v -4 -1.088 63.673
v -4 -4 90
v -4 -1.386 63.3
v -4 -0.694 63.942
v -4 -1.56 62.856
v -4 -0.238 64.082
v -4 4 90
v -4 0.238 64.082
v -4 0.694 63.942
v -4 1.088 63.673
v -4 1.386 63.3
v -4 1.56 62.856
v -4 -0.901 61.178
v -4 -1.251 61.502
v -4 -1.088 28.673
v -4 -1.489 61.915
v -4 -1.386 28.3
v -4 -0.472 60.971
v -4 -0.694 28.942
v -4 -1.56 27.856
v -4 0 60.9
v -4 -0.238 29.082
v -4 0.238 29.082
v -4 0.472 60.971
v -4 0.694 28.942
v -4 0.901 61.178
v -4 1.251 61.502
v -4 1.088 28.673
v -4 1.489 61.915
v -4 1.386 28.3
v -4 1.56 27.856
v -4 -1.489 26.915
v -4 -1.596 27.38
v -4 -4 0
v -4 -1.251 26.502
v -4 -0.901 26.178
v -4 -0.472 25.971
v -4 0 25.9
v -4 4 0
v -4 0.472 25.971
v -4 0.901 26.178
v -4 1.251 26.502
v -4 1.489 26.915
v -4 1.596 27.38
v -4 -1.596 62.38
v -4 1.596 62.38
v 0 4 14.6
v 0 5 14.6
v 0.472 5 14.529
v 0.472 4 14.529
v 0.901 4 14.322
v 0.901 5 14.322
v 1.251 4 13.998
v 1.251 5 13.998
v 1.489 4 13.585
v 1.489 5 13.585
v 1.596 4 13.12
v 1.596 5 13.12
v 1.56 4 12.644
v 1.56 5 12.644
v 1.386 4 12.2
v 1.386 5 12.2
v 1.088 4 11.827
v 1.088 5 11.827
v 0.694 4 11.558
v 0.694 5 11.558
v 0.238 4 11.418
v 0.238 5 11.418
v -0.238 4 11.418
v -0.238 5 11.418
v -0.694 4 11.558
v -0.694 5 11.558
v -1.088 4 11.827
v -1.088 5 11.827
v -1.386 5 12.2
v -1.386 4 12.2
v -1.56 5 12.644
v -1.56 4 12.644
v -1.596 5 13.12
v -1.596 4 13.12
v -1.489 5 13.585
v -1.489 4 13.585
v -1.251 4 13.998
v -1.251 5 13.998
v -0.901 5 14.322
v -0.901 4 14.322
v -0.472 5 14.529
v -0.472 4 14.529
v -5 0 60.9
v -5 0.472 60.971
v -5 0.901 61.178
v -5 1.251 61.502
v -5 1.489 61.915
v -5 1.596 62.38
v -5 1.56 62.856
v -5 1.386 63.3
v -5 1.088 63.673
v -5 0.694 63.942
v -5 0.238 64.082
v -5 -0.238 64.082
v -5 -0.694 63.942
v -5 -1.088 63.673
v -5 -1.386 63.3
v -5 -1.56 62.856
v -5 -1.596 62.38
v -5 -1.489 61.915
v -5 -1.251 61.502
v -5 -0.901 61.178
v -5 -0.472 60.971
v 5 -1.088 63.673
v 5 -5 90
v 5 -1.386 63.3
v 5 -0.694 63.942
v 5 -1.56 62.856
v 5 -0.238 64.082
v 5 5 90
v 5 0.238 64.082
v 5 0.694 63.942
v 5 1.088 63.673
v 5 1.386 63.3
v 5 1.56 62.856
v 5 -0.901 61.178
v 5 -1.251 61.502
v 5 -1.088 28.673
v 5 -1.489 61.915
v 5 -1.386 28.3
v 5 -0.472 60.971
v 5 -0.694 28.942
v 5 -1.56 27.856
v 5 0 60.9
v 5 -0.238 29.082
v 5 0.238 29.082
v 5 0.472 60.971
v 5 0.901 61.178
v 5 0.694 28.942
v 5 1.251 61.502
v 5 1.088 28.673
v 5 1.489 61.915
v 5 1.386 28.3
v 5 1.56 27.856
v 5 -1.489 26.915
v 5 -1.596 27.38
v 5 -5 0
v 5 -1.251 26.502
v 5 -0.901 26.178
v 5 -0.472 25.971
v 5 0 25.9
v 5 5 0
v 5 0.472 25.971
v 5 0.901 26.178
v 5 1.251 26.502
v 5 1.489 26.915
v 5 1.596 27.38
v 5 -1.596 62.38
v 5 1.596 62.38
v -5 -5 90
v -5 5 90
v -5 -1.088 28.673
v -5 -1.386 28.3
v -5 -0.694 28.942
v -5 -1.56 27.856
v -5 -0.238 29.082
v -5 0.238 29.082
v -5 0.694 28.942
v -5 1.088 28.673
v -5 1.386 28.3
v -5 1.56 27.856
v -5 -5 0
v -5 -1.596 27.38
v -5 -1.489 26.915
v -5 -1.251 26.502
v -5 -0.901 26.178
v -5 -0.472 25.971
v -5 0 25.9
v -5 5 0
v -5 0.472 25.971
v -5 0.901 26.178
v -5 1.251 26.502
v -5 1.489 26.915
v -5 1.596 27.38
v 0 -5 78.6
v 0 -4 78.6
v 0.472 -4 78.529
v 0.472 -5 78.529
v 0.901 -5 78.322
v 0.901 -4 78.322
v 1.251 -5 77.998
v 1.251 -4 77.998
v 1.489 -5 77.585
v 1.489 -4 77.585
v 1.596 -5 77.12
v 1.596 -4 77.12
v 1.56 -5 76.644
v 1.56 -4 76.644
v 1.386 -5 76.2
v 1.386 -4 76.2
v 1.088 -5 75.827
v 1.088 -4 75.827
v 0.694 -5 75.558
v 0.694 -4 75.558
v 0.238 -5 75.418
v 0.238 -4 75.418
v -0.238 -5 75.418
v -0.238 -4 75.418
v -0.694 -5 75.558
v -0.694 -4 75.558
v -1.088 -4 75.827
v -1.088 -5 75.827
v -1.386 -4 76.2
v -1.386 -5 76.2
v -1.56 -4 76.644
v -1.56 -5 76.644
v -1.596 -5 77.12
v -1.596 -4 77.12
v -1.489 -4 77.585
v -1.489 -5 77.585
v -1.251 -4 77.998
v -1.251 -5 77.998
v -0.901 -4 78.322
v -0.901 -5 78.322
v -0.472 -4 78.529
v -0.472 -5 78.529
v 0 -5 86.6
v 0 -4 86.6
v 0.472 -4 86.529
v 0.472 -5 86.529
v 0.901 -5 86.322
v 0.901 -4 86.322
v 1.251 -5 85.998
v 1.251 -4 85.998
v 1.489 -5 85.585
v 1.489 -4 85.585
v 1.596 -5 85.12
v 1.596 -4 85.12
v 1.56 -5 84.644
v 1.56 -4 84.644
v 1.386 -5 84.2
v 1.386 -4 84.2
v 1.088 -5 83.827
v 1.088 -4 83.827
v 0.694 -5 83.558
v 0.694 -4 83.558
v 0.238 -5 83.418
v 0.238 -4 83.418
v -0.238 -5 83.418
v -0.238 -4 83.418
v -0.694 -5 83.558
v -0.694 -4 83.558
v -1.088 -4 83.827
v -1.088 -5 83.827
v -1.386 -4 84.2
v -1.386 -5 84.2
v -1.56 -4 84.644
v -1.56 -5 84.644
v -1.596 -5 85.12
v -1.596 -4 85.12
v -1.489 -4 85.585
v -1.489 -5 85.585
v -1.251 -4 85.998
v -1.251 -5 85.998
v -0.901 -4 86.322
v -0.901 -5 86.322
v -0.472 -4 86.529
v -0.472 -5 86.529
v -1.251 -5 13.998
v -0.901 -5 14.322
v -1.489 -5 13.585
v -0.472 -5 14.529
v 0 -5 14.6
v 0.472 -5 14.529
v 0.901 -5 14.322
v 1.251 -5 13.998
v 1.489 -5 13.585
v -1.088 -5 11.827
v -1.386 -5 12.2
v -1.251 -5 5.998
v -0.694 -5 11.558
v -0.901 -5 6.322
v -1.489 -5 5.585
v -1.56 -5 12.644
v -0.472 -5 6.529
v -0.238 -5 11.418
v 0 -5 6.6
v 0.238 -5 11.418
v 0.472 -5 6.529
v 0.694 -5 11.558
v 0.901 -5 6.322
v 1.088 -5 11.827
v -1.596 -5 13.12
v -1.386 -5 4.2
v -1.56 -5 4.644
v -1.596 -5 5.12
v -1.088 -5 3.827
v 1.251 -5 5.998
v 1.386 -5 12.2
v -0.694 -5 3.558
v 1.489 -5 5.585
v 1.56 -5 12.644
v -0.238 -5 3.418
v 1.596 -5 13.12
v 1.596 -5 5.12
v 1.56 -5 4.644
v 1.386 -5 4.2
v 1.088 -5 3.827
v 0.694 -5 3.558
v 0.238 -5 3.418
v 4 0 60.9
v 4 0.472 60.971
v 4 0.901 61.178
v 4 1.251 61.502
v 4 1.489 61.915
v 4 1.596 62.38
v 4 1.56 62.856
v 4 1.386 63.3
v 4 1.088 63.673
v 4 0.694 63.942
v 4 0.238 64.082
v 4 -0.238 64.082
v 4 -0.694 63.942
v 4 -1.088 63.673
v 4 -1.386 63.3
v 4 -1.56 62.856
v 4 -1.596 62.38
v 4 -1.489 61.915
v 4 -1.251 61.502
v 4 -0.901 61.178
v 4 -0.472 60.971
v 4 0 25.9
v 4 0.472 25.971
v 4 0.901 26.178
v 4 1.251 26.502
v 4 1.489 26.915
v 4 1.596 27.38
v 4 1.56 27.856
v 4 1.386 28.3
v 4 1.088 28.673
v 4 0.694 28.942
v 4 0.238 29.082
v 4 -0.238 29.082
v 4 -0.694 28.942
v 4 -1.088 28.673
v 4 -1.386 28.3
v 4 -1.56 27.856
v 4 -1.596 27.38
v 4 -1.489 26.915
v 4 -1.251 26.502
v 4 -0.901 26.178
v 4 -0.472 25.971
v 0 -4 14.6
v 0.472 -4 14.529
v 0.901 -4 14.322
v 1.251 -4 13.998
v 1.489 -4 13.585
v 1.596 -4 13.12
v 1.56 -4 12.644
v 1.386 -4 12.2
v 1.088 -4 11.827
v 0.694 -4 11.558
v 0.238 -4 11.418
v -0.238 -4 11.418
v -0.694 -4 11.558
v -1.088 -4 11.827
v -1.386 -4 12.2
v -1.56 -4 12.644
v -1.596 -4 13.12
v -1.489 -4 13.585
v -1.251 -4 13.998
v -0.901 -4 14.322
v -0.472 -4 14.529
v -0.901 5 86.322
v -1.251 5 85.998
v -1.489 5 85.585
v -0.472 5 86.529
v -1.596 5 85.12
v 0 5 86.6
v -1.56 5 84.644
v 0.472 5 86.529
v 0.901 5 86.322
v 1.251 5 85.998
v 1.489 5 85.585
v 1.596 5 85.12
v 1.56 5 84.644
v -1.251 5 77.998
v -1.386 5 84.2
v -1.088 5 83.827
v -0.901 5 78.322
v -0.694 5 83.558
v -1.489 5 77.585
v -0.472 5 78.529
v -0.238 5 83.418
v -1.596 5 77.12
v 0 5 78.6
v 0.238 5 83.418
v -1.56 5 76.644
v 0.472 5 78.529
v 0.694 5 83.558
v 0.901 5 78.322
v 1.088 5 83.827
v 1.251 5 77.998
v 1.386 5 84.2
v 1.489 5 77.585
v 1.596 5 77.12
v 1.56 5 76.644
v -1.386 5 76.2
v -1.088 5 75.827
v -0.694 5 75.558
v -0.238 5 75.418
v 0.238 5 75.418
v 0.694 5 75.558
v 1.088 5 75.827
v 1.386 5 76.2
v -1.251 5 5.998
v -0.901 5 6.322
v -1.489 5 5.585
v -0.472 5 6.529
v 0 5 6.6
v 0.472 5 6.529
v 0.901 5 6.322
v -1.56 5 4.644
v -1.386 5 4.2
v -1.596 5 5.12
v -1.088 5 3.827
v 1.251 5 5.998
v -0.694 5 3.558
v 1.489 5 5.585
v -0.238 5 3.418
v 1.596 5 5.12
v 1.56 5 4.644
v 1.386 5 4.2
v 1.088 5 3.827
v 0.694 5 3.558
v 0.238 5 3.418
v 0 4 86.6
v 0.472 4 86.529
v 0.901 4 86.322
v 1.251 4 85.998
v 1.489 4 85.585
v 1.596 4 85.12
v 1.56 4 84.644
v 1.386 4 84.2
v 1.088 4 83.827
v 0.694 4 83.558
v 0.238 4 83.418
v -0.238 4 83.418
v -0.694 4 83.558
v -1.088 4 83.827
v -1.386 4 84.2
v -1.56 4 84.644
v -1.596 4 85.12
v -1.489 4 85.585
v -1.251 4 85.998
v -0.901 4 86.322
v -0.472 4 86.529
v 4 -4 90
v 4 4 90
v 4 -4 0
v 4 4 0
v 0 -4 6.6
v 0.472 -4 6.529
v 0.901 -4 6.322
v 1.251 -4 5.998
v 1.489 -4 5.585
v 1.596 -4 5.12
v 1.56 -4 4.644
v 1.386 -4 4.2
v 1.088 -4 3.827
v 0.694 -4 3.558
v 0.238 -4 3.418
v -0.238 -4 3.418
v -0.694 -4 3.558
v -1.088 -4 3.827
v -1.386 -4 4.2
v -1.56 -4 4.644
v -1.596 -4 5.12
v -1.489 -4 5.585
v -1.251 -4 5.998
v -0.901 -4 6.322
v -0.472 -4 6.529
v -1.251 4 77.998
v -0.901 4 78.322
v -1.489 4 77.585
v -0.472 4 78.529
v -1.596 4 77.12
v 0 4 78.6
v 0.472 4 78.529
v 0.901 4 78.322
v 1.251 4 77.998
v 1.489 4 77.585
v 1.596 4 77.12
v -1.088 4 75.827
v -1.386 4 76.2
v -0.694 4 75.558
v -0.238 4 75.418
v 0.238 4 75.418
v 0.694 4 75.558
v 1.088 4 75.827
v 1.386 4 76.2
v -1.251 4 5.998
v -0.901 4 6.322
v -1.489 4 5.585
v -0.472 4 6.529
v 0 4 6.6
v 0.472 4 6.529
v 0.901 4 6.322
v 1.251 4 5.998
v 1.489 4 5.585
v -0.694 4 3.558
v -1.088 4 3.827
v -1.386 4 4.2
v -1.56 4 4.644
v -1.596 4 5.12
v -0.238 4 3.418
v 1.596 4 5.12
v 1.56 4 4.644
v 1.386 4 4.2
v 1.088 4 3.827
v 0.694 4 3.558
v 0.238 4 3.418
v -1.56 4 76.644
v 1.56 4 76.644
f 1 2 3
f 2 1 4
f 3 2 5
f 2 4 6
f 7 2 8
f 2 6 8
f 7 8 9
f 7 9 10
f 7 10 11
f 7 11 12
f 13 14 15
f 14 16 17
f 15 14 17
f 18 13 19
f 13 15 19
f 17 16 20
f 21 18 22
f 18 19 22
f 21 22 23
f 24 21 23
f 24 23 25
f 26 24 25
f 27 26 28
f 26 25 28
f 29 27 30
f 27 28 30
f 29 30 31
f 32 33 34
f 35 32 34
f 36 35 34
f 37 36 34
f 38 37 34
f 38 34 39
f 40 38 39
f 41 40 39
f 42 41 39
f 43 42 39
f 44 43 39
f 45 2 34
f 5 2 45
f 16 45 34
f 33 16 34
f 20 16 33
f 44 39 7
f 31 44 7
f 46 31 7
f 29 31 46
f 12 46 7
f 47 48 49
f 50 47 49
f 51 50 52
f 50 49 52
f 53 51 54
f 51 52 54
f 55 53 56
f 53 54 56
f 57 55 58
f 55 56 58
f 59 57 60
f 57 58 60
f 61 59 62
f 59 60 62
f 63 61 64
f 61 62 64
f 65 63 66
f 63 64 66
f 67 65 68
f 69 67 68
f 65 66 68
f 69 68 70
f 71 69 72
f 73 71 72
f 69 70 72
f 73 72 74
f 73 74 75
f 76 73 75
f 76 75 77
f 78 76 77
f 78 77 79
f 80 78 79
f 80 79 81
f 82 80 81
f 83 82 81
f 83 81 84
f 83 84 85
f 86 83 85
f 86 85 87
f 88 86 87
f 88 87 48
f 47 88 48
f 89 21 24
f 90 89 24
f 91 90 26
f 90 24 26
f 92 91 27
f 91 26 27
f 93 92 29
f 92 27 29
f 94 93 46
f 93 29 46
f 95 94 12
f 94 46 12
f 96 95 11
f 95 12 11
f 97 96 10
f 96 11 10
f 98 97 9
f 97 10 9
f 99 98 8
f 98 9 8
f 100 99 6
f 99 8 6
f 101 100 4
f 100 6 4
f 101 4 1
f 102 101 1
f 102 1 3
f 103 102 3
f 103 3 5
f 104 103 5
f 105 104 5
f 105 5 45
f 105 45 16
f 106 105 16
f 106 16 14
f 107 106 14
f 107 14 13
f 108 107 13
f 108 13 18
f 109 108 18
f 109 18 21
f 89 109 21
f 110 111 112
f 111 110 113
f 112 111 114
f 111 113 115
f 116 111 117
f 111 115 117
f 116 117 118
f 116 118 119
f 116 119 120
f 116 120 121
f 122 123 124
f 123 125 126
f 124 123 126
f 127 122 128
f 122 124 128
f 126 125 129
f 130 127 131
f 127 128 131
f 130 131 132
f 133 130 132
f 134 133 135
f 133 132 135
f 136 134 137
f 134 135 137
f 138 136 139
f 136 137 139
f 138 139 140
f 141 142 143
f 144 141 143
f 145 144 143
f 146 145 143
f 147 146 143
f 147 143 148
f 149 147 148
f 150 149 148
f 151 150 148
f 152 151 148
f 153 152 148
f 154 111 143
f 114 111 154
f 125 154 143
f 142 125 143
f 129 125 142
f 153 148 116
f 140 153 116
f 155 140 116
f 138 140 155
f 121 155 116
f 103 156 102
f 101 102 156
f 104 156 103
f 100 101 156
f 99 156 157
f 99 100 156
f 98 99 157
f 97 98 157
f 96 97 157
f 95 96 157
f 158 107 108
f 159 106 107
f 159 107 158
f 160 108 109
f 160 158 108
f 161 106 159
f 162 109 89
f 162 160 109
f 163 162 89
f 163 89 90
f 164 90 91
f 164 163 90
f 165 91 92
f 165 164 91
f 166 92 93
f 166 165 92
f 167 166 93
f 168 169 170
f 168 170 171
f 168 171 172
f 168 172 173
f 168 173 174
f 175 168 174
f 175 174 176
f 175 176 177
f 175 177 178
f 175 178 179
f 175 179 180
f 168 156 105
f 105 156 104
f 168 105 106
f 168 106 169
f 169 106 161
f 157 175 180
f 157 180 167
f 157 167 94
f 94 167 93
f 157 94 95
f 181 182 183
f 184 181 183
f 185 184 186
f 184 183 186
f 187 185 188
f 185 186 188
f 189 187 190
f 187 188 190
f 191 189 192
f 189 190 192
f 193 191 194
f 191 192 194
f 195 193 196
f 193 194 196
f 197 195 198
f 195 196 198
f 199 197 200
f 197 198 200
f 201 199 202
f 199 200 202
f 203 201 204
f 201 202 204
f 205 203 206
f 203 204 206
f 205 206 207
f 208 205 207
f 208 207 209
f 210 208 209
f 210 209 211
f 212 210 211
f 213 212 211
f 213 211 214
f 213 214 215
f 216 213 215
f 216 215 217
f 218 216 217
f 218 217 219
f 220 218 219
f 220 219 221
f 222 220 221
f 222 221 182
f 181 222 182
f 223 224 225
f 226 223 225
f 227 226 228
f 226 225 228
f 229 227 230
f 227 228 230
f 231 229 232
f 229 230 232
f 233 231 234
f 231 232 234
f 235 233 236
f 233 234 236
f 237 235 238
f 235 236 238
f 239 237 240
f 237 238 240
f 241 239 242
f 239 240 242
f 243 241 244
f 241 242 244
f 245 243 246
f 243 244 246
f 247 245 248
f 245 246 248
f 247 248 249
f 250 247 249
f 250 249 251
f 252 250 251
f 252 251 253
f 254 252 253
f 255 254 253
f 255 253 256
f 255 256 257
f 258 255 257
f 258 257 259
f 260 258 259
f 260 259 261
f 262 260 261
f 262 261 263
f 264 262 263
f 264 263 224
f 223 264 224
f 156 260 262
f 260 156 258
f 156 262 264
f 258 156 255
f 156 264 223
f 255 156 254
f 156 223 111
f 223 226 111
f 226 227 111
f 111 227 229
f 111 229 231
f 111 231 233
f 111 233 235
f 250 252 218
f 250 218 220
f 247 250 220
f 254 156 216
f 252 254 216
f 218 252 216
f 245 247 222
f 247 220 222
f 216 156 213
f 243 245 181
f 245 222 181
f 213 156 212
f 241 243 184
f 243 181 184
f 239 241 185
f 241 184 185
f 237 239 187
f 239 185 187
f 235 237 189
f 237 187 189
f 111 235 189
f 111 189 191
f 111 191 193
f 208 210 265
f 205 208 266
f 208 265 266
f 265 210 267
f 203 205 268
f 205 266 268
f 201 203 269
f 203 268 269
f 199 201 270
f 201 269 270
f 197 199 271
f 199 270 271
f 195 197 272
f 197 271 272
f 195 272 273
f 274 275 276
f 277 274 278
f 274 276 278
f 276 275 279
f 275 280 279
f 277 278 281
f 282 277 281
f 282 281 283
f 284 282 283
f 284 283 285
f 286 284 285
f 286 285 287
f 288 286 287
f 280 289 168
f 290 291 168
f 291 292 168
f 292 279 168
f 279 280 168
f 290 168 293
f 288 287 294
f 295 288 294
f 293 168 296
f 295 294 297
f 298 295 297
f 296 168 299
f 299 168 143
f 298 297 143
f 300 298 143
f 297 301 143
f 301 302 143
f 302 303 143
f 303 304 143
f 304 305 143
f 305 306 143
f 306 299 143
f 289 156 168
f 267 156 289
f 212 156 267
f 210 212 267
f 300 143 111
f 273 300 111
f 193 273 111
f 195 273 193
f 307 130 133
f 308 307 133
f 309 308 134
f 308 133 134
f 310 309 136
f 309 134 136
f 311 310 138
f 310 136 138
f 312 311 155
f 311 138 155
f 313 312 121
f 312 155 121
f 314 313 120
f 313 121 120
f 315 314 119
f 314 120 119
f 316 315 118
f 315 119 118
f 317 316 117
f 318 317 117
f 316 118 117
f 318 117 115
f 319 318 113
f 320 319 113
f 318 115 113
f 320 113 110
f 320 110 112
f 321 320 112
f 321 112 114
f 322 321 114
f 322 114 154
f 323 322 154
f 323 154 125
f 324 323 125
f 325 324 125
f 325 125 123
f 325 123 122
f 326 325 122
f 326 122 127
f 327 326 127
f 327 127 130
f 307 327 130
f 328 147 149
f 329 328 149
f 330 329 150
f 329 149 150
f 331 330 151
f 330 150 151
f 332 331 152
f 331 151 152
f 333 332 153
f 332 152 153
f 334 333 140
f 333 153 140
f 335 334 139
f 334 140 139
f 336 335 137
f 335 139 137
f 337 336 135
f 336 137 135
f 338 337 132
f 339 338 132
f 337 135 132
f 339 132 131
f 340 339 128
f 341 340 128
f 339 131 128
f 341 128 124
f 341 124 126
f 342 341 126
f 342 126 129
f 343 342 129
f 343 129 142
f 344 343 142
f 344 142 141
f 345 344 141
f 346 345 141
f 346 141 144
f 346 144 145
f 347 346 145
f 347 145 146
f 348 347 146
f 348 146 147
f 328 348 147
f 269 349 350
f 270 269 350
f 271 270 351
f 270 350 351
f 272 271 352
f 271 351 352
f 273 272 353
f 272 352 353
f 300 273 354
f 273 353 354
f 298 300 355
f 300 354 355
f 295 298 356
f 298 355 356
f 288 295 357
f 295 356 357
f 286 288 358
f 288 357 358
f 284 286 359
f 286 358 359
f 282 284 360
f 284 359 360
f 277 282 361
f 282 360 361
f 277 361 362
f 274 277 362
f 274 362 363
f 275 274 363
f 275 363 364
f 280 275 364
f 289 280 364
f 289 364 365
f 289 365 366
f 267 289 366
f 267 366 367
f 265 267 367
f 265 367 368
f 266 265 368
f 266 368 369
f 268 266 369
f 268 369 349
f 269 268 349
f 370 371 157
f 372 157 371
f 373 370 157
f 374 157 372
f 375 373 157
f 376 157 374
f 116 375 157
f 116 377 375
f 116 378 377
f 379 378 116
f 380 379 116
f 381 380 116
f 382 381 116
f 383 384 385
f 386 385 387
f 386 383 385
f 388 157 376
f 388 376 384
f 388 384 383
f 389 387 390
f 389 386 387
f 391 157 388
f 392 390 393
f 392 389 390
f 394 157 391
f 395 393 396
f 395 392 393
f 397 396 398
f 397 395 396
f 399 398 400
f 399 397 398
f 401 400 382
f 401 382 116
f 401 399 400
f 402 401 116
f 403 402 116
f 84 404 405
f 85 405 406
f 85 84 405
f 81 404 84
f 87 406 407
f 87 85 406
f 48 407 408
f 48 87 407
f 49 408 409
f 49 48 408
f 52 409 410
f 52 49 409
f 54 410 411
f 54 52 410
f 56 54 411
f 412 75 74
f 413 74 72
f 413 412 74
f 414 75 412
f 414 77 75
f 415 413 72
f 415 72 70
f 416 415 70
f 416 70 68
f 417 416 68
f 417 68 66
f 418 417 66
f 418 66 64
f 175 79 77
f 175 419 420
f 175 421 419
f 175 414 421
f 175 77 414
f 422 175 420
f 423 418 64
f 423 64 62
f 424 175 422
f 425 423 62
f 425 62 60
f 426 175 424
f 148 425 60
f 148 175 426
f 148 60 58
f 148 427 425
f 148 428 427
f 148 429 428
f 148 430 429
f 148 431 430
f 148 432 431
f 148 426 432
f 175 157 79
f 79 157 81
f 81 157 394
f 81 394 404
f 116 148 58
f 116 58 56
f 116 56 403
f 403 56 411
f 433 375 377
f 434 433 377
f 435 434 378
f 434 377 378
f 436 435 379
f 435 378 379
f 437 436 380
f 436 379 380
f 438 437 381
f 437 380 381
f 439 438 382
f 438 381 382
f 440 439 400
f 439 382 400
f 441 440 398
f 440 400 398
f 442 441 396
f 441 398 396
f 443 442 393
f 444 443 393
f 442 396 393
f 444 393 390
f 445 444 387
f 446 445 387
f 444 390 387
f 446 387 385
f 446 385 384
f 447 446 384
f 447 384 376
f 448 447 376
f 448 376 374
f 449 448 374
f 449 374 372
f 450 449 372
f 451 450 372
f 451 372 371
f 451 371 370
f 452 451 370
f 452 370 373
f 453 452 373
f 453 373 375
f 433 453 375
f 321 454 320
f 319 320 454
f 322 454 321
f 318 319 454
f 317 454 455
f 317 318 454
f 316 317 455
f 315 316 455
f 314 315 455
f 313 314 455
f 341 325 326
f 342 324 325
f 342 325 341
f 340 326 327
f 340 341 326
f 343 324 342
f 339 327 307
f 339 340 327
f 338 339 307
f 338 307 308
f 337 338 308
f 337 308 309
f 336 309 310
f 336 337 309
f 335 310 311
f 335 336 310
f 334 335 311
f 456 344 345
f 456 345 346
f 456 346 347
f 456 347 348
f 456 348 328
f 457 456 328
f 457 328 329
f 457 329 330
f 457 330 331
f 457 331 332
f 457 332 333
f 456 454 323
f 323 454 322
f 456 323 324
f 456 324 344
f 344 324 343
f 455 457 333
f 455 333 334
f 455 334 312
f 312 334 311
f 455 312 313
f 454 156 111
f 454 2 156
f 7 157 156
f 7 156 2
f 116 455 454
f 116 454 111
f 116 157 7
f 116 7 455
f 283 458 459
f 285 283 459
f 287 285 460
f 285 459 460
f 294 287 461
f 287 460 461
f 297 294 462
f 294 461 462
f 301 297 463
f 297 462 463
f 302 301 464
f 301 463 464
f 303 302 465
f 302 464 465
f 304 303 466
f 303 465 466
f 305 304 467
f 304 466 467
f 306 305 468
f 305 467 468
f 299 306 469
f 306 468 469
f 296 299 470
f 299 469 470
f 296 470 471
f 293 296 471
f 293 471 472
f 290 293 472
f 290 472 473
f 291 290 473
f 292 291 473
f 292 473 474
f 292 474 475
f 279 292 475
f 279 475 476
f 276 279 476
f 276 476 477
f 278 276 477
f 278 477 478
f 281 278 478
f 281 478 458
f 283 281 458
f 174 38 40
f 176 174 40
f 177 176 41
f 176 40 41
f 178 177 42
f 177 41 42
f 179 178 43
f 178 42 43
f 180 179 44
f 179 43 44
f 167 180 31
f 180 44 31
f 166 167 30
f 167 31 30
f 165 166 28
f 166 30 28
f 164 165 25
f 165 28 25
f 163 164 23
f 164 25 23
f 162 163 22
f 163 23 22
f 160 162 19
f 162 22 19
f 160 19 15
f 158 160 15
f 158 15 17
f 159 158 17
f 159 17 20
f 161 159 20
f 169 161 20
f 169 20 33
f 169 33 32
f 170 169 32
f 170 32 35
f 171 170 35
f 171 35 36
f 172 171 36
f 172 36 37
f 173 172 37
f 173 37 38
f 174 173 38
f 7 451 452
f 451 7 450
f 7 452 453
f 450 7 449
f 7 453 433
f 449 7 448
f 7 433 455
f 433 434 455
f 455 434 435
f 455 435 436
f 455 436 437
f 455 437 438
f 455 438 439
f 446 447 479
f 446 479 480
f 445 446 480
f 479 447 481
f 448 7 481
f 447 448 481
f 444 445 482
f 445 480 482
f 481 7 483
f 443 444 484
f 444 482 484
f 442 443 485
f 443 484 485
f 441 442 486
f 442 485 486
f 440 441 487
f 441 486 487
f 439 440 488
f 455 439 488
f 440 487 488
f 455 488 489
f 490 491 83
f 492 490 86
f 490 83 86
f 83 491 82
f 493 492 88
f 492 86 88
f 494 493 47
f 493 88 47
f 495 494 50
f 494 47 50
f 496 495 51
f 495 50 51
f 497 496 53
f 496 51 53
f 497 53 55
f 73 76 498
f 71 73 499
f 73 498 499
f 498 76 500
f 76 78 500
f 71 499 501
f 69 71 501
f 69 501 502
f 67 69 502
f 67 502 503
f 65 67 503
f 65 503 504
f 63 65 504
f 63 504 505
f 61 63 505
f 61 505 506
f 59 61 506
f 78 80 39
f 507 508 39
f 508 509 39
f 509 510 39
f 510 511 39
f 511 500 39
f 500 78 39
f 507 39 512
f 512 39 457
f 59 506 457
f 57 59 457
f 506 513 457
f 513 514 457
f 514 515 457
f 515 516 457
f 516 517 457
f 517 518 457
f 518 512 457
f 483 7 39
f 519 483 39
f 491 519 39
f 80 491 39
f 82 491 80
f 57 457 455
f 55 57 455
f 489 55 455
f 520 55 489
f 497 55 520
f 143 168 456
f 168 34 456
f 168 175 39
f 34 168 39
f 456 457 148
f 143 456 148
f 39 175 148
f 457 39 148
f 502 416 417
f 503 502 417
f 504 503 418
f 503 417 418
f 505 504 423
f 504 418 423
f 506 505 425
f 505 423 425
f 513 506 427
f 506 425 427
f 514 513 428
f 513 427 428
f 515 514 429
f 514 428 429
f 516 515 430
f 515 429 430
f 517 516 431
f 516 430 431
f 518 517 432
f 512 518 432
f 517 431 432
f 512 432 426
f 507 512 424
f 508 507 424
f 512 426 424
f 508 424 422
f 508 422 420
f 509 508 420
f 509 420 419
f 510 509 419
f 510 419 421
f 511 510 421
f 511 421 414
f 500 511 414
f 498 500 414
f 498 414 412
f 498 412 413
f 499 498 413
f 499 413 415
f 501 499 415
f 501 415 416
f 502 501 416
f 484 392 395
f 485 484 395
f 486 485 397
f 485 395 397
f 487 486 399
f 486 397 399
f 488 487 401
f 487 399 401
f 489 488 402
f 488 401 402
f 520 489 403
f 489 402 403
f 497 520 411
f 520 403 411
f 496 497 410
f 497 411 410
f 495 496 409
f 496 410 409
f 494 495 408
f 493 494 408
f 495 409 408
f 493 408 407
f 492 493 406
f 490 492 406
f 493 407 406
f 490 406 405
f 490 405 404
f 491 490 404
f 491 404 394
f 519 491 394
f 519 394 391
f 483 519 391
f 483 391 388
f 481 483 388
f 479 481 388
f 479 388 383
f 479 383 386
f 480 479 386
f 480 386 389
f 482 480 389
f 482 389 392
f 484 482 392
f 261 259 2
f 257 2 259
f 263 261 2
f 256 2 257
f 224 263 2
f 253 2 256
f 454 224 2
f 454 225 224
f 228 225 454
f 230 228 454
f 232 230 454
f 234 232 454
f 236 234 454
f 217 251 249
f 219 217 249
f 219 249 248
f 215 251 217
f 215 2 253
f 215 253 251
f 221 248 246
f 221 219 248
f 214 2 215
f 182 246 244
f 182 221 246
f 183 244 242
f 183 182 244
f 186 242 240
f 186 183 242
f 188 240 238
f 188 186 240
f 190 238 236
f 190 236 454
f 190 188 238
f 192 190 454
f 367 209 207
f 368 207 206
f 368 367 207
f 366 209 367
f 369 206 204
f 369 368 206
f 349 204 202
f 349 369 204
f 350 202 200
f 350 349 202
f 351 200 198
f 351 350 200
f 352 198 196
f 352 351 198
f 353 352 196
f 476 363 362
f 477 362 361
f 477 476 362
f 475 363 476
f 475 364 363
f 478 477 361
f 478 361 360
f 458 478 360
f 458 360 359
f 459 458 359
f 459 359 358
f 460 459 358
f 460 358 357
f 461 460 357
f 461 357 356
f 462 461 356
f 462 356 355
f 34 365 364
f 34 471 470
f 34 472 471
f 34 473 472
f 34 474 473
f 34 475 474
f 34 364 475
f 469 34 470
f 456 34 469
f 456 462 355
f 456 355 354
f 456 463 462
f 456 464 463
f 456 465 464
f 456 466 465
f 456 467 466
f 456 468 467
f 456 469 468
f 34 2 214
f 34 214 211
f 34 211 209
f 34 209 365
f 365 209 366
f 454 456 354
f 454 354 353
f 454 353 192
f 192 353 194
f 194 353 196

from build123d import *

# Parameters (mm, degrees)
SKETCH_282_W          = 10
SKETCH_282_H          = 10
SKETCH_282_W_2        = 8
SKETCH_282_H_2        = 8
EXTRUDE_339_DEPTH     = 90
SKETCH_411_R          = 1.6
CUT_EXTRUDE_834_DEPTH = 91.691785736
SKETCH_636_R          = 1.6
CUT_EXTRUDE_878_DEPTH = 91.691785736


with BuildPart() as part:
    # Sketch 282 → Extrude 339 (new body)
    with BuildSketch(Plane.XY):
        Rectangle(SKETCH_282_W, SKETCH_282_H)
        Rectangle(SKETCH_282_W_2, SKETCH_282_H_2, mode=Mode.SUBTRACT)
    extrude(amount=EXTRUDE_339_DEPTH)

    # Sketch 411 → Cut-Extrude 834 (cut, through all)
    with BuildSketch(Plane(origin=(0, 5, 0), x_dir=(1, 0, 0), z_dir=(0, 1, 0))):
        with Locations(Location((0, -5, 0), (0, 0, 270))):
            Circle(SKETCH_411_R)
        with Locations(Location((0, -85, 0), (0, 0, 270))):
            Circle(SKETCH_411_R)
        with Locations(Location((0, -13, 0), (0, 0, 270))):
            Circle(SKETCH_411_R)
        with Locations(Location((0, -77, 0), (0, 0, 270))):
            Circle(SKETCH_411_R)
    extrude(amount=-CUT_EXTRUDE_834_DEPTH, mode=Mode.SUBTRACT)

    # Sketch 636 → Cut-Extrude 878 (cut, through all)
    with BuildSketch(Plane(origin=(5, 0, 0), x_dir=(0, 0, -1), z_dir=(1, 0, 0))):
        with Locations((-27.5, 0)):
            Circle(SKETCH_636_R)
        with Locations((-62.5, 0)):
            Circle(SKETCH_636_R)
    extrude(amount=-CUT_EXTRUDE_878_DEPTH, mode=Mode.SUBTRACT)


solid = part.part
